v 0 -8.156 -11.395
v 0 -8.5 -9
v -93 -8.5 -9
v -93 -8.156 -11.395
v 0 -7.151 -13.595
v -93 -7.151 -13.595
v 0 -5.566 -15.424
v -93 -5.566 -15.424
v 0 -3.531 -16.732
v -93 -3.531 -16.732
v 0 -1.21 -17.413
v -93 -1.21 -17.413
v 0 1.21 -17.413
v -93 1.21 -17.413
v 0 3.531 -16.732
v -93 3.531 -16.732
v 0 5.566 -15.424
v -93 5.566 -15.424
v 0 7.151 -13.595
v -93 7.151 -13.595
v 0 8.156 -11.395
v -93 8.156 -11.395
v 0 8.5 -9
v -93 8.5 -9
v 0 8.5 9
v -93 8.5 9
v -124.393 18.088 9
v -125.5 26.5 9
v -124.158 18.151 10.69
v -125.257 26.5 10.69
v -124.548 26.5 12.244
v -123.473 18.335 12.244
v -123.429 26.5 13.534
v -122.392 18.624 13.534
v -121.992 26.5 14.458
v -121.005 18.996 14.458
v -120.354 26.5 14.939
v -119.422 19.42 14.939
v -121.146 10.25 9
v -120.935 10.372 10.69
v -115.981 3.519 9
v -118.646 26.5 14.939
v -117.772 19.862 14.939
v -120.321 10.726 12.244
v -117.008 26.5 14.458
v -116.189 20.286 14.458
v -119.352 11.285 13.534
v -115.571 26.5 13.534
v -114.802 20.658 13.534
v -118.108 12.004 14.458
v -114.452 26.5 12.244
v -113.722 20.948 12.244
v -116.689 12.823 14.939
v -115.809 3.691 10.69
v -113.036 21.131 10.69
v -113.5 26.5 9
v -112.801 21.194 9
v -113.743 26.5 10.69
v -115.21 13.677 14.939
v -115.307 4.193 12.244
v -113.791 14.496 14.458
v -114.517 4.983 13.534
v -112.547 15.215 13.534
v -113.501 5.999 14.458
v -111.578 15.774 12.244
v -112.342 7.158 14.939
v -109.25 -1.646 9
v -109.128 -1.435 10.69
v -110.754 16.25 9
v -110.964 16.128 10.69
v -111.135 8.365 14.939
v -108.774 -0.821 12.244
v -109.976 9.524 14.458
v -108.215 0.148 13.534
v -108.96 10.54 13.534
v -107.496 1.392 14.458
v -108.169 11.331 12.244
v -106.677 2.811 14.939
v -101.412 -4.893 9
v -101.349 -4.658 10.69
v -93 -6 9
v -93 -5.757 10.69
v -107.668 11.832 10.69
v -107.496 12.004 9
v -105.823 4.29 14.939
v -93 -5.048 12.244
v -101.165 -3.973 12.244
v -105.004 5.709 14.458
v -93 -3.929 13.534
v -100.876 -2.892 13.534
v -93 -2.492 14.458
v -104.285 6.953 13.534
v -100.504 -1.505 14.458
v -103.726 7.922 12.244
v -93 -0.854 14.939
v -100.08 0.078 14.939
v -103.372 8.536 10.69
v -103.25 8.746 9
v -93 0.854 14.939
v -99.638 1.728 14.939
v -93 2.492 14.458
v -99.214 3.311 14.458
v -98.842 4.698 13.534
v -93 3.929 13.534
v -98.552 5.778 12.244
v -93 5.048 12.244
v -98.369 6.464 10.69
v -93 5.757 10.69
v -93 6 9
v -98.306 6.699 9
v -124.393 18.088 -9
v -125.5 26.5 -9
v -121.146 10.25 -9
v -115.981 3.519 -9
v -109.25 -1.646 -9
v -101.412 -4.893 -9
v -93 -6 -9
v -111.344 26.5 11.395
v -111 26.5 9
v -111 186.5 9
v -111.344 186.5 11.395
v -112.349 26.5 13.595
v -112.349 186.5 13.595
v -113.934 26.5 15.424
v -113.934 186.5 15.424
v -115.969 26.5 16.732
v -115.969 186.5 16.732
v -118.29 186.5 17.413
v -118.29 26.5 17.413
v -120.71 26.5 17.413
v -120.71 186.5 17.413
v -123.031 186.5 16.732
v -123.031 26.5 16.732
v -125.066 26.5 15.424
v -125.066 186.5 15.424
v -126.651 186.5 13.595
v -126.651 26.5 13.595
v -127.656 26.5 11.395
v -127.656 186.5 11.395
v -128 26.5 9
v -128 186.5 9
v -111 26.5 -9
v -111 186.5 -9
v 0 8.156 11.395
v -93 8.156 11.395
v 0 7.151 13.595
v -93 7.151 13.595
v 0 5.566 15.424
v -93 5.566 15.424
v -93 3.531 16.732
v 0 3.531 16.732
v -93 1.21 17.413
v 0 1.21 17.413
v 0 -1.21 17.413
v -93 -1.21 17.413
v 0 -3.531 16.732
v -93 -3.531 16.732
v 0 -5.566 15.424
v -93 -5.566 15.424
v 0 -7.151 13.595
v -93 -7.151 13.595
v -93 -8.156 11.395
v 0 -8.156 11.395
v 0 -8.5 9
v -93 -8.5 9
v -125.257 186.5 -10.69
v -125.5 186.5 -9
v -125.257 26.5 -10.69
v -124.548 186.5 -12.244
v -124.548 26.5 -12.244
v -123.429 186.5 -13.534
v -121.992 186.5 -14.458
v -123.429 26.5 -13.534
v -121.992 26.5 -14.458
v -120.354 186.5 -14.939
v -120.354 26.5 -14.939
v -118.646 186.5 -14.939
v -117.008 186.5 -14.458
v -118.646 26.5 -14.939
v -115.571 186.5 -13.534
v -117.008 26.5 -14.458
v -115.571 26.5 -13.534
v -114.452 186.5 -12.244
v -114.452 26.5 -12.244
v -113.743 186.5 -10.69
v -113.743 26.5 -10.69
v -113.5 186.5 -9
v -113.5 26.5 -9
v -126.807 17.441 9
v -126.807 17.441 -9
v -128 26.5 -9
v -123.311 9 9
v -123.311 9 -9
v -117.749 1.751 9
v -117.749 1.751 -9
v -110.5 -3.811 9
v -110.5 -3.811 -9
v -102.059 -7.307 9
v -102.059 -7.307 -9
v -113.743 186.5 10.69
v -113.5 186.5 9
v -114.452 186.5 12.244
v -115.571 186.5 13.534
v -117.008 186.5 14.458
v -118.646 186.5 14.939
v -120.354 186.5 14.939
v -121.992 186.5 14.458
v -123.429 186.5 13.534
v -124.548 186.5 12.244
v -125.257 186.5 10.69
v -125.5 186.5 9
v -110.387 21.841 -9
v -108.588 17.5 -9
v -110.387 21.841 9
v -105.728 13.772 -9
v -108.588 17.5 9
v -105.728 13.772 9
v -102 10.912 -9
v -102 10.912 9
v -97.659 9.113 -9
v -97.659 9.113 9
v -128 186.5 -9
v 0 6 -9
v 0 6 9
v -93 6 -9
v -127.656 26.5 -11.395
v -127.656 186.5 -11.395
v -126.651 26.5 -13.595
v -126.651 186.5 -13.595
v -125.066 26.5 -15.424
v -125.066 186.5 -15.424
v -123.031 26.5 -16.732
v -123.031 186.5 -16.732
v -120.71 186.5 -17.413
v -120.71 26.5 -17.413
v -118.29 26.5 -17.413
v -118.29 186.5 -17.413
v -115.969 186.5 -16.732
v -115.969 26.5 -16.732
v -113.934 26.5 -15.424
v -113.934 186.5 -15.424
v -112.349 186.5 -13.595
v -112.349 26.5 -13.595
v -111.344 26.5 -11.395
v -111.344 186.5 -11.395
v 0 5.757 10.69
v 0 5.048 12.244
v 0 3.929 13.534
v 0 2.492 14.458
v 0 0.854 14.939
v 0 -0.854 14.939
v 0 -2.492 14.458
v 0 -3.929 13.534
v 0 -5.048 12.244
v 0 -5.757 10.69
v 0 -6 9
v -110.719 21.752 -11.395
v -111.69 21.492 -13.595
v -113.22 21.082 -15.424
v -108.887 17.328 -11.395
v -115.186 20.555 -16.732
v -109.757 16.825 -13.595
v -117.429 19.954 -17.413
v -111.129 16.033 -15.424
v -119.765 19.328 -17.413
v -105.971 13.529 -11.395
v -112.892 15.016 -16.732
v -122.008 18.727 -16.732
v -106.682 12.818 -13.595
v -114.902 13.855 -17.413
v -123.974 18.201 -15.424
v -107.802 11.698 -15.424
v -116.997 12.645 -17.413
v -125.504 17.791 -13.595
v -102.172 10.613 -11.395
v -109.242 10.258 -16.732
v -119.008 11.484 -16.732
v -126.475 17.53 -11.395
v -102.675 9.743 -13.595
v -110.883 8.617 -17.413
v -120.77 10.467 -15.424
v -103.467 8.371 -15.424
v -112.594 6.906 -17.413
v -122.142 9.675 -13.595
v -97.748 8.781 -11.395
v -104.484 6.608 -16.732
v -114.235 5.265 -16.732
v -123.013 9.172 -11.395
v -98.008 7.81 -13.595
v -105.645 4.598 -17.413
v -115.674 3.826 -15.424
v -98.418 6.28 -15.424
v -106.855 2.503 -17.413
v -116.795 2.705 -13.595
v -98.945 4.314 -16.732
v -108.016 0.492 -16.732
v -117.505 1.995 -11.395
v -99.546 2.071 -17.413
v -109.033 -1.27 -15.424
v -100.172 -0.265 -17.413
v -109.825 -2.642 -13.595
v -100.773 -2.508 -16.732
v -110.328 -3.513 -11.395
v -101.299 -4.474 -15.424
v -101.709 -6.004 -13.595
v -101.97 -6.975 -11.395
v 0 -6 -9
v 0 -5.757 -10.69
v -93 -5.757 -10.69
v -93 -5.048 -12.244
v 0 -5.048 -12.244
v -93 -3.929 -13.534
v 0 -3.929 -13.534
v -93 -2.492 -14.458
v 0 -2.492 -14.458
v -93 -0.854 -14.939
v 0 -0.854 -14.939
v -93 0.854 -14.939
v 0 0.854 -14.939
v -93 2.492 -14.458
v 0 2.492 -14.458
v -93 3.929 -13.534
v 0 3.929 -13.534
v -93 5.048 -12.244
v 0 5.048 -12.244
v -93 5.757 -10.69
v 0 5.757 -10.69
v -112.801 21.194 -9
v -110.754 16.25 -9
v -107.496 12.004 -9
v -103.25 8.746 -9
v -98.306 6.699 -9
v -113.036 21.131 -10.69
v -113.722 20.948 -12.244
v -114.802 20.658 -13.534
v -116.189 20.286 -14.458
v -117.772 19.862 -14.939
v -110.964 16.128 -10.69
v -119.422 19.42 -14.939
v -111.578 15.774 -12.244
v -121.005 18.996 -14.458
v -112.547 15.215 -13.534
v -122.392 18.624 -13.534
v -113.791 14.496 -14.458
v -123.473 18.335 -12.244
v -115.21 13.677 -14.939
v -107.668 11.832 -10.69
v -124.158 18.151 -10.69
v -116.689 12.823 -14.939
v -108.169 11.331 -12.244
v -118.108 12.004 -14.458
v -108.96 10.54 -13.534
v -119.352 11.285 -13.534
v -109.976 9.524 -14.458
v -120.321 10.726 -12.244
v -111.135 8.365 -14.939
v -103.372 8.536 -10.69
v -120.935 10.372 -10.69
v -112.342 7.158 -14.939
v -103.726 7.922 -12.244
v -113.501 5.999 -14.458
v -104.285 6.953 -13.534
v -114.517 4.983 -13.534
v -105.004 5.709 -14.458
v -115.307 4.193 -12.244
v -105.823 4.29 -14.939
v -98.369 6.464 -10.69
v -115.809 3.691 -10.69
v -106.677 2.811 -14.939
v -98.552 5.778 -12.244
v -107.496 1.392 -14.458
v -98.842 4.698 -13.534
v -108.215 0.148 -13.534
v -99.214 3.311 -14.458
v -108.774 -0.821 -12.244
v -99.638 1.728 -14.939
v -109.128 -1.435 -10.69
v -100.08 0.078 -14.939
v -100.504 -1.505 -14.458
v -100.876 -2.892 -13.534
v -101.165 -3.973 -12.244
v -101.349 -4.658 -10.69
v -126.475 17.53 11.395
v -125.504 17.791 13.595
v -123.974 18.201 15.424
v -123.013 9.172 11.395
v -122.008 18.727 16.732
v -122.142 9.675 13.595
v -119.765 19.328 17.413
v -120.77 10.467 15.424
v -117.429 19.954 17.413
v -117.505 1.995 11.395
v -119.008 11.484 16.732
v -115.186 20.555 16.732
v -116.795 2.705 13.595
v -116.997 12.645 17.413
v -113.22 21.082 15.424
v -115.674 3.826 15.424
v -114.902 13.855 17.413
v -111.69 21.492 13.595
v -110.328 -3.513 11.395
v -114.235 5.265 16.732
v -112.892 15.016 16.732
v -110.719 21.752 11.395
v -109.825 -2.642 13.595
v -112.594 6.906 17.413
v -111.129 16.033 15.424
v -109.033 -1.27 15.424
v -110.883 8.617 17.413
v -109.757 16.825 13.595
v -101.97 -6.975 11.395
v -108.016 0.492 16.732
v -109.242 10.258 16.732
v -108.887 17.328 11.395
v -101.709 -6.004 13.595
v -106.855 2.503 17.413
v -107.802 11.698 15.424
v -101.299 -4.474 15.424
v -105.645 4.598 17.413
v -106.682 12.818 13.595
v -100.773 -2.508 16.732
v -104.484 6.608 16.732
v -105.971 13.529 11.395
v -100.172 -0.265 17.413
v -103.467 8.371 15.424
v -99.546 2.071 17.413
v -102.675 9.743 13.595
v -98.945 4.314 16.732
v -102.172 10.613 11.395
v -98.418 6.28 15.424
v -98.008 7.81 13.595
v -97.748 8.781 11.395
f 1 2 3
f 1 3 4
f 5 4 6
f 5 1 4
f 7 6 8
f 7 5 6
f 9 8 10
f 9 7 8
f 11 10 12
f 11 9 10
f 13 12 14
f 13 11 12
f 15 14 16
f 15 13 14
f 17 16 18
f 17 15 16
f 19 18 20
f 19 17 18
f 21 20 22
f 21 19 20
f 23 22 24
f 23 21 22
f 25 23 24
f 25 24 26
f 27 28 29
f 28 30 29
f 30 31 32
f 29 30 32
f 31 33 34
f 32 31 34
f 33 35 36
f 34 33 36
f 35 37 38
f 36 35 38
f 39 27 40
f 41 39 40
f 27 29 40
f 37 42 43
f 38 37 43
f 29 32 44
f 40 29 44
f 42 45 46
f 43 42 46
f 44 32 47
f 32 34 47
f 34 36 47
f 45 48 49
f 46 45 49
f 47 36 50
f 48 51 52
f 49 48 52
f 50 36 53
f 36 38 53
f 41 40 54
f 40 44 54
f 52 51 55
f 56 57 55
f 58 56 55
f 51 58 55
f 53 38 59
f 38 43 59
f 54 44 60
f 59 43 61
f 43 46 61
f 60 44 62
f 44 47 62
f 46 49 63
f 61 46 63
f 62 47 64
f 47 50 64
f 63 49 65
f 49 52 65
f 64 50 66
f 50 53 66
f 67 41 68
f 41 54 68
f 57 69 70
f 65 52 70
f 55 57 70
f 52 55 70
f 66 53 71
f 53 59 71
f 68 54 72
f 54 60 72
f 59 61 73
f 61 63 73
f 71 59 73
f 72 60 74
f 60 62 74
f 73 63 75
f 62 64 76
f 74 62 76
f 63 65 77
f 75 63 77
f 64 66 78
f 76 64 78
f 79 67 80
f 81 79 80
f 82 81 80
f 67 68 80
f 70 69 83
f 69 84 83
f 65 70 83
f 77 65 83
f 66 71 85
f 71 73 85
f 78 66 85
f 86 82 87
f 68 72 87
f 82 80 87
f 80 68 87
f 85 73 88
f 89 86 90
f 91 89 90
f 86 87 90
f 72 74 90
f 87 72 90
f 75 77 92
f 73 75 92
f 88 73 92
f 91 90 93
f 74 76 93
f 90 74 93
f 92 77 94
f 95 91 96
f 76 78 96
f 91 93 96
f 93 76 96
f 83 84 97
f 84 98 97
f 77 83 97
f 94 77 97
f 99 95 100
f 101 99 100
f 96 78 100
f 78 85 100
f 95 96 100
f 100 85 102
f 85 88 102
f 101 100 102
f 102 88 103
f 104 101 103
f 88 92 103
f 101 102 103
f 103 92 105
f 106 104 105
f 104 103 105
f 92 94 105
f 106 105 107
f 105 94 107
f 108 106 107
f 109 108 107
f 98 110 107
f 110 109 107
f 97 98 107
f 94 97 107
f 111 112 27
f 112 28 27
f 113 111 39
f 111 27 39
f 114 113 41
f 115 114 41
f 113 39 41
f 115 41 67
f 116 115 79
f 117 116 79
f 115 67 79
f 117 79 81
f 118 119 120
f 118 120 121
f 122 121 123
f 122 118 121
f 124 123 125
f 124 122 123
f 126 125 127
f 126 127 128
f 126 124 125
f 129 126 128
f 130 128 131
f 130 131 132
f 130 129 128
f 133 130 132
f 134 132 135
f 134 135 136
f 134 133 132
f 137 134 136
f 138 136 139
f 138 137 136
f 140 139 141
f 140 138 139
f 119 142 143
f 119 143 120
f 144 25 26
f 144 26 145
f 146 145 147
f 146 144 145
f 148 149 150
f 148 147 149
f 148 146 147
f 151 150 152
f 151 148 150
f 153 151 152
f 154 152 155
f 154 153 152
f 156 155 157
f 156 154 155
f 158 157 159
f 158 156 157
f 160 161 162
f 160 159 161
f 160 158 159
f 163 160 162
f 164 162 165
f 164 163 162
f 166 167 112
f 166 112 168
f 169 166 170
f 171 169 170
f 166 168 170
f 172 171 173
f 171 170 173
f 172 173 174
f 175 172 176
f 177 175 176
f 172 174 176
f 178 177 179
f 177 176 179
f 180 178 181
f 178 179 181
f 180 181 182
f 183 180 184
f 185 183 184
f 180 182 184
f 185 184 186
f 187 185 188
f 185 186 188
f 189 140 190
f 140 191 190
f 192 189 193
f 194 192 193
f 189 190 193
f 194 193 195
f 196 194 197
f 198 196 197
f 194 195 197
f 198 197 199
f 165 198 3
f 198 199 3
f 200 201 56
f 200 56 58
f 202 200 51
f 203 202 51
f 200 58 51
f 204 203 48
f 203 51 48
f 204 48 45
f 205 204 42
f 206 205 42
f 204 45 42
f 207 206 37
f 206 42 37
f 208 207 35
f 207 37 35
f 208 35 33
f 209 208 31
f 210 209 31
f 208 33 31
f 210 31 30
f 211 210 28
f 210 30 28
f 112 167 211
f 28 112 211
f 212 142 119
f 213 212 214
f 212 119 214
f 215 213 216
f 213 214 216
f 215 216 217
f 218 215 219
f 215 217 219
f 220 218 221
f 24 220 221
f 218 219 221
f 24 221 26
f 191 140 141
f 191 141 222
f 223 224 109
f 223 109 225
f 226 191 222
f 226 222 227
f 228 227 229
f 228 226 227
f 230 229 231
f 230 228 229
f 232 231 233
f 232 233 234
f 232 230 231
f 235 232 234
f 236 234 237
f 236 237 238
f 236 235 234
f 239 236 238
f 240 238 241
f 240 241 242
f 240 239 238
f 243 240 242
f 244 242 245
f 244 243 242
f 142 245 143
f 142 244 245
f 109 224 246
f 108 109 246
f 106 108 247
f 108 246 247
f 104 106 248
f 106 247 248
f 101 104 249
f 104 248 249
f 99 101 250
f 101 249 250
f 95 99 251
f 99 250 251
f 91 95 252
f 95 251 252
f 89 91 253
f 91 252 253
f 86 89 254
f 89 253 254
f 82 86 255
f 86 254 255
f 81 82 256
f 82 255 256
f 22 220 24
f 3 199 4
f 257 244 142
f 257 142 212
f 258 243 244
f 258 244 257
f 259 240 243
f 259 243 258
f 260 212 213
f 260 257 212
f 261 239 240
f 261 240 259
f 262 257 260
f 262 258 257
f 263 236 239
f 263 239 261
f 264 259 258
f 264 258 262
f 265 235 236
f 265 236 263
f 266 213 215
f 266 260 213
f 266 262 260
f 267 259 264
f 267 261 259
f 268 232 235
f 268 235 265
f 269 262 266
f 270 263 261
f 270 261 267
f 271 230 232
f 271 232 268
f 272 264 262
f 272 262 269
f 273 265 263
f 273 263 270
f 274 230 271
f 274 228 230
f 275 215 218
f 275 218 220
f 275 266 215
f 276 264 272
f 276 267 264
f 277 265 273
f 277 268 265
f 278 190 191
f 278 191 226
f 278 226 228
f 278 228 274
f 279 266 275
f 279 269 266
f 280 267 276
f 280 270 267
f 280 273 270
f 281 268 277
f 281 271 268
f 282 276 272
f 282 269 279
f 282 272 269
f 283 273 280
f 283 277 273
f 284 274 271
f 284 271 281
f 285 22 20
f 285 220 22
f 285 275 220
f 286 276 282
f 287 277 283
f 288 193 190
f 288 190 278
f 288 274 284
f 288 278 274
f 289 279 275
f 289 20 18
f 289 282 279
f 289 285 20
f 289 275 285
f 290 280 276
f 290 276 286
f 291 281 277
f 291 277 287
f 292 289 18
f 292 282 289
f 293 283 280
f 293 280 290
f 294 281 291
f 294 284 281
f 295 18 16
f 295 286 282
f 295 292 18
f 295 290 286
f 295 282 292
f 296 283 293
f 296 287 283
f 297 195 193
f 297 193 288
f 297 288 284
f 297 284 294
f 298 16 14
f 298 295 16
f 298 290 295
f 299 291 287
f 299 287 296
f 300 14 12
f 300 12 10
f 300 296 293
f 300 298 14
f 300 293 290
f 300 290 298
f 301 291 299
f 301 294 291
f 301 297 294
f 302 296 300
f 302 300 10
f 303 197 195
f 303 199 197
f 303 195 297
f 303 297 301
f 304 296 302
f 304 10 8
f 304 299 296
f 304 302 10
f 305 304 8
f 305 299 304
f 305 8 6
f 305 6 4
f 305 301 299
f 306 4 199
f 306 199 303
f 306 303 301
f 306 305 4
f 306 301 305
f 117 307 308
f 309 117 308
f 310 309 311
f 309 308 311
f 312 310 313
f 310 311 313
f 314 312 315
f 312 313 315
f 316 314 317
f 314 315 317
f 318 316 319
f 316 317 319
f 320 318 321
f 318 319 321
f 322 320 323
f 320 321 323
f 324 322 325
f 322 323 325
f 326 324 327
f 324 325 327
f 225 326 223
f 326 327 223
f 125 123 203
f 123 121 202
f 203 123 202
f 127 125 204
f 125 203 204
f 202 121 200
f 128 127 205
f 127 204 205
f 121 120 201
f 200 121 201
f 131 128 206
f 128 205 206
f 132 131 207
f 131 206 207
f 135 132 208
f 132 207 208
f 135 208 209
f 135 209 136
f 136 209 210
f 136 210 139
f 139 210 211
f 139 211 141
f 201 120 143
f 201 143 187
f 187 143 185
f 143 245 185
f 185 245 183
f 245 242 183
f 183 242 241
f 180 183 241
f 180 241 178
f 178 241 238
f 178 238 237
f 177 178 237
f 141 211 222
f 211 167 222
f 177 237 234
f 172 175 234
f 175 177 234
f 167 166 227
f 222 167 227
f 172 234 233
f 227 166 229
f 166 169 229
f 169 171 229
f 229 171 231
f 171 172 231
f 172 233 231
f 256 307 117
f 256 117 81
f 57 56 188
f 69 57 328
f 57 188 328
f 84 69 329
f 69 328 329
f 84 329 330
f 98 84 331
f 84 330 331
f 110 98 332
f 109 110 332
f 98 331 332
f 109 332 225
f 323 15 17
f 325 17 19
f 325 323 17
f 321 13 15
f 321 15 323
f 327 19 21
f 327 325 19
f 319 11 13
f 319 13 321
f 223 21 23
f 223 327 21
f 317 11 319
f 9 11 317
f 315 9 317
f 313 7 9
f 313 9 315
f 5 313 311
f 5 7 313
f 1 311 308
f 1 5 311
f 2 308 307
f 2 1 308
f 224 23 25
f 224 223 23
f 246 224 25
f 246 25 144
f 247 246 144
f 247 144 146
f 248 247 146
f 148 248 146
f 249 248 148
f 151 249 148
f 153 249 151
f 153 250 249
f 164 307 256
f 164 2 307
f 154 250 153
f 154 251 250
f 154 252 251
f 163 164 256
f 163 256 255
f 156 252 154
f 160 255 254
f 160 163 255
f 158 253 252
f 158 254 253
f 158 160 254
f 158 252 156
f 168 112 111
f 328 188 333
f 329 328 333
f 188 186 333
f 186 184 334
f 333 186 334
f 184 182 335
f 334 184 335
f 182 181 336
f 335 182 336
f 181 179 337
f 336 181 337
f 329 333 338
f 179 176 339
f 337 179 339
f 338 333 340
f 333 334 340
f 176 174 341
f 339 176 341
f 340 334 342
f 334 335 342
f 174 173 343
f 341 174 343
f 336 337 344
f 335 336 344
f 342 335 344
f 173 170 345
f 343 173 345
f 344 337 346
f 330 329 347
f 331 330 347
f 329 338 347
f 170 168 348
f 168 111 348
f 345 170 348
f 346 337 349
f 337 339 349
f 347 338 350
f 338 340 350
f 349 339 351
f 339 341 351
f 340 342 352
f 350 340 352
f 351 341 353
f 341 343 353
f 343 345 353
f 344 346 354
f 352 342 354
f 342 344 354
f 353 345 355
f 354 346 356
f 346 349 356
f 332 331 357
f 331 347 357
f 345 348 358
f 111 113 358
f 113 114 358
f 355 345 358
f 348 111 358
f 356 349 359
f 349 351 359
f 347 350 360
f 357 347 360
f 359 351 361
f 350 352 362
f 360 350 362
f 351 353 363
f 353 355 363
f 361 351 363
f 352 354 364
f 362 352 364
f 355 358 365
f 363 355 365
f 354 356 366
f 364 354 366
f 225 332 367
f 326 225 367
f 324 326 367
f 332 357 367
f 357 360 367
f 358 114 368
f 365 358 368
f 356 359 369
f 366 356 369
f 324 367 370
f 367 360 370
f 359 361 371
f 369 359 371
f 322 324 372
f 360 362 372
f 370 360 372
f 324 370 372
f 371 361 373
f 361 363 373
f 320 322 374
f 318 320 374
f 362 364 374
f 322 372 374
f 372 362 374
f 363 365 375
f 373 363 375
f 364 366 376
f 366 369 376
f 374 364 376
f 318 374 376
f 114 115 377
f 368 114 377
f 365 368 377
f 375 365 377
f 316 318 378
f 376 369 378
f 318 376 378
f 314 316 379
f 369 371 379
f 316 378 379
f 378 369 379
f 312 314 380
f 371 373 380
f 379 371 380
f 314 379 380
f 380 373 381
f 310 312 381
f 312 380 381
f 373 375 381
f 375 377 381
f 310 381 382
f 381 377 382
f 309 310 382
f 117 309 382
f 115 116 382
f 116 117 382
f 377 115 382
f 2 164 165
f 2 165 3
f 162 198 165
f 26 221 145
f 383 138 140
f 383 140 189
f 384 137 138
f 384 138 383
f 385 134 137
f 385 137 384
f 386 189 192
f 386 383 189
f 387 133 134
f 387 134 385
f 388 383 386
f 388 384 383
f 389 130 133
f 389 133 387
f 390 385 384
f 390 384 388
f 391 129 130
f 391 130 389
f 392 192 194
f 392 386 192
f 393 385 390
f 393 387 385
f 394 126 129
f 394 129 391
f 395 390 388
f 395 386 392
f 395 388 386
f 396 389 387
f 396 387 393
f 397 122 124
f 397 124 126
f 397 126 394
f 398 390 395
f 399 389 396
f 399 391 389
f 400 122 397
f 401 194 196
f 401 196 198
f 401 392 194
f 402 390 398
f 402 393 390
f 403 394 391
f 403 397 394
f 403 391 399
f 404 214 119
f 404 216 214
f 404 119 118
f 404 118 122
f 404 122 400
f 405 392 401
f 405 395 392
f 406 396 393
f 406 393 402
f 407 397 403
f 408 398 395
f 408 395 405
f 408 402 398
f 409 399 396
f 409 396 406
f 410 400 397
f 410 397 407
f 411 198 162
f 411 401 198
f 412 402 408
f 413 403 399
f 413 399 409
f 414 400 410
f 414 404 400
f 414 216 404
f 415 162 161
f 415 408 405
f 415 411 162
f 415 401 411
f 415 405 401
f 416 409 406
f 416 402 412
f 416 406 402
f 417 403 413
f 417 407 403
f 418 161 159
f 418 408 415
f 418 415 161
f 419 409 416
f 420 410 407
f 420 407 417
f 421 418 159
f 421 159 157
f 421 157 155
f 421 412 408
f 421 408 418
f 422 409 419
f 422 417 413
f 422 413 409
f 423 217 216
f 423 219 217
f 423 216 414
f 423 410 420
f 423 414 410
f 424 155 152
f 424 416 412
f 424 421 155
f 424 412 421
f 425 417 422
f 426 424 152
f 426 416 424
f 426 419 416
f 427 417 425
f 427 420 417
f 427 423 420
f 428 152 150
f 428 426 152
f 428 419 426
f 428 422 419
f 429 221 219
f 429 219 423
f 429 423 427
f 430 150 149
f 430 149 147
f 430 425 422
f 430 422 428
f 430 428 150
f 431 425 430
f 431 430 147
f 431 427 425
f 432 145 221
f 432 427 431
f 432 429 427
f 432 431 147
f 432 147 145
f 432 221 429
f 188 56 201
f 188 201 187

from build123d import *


with BuildPart() as part:
    # Balayage2: sweep along a path in Esquisse2
    with BuildLine(Plane.XY) as balayage2_path:
        Line((-128, 186.5), (-128, 26.5))
        ThreePointArc((-128, 26.5), (-117.748737342, 1.751262658), (-93, -8.5))
        Line((-93, -8.5), (0, -8.5))
    # Esquisse1 → Balayage2 (sweep)
    with BuildSketch(Plane(origin=(0, 0, 0), x_dir=(0, 0, -1), z_dir=(1, 0, 0))):
        with BuildLine():
            Line((-9, -8.5), (9, -8.5))
            ThreePointArc((9, -8.5), (17.5, 0), (9, 8.5))
            Line((9, 8.5), (-9, 8.5))
            ThreePointArc((-9, 8.5), (-17.5, 0), (-9, -8.5))
        make_face()
        with BuildLine():
            Line((-9, 6), (9, 6))
            ThreePointArc((9, 6), (15, 0), (9, -6))
            Line((9, -6), (-9, -6))
            ThreePointArc((-9, -6), (-15, 0), (-9, 6))
        make_face(mode=Mode.SUBTRACT)
    sweep(path=balayage2_path.line)


solid = part.part
